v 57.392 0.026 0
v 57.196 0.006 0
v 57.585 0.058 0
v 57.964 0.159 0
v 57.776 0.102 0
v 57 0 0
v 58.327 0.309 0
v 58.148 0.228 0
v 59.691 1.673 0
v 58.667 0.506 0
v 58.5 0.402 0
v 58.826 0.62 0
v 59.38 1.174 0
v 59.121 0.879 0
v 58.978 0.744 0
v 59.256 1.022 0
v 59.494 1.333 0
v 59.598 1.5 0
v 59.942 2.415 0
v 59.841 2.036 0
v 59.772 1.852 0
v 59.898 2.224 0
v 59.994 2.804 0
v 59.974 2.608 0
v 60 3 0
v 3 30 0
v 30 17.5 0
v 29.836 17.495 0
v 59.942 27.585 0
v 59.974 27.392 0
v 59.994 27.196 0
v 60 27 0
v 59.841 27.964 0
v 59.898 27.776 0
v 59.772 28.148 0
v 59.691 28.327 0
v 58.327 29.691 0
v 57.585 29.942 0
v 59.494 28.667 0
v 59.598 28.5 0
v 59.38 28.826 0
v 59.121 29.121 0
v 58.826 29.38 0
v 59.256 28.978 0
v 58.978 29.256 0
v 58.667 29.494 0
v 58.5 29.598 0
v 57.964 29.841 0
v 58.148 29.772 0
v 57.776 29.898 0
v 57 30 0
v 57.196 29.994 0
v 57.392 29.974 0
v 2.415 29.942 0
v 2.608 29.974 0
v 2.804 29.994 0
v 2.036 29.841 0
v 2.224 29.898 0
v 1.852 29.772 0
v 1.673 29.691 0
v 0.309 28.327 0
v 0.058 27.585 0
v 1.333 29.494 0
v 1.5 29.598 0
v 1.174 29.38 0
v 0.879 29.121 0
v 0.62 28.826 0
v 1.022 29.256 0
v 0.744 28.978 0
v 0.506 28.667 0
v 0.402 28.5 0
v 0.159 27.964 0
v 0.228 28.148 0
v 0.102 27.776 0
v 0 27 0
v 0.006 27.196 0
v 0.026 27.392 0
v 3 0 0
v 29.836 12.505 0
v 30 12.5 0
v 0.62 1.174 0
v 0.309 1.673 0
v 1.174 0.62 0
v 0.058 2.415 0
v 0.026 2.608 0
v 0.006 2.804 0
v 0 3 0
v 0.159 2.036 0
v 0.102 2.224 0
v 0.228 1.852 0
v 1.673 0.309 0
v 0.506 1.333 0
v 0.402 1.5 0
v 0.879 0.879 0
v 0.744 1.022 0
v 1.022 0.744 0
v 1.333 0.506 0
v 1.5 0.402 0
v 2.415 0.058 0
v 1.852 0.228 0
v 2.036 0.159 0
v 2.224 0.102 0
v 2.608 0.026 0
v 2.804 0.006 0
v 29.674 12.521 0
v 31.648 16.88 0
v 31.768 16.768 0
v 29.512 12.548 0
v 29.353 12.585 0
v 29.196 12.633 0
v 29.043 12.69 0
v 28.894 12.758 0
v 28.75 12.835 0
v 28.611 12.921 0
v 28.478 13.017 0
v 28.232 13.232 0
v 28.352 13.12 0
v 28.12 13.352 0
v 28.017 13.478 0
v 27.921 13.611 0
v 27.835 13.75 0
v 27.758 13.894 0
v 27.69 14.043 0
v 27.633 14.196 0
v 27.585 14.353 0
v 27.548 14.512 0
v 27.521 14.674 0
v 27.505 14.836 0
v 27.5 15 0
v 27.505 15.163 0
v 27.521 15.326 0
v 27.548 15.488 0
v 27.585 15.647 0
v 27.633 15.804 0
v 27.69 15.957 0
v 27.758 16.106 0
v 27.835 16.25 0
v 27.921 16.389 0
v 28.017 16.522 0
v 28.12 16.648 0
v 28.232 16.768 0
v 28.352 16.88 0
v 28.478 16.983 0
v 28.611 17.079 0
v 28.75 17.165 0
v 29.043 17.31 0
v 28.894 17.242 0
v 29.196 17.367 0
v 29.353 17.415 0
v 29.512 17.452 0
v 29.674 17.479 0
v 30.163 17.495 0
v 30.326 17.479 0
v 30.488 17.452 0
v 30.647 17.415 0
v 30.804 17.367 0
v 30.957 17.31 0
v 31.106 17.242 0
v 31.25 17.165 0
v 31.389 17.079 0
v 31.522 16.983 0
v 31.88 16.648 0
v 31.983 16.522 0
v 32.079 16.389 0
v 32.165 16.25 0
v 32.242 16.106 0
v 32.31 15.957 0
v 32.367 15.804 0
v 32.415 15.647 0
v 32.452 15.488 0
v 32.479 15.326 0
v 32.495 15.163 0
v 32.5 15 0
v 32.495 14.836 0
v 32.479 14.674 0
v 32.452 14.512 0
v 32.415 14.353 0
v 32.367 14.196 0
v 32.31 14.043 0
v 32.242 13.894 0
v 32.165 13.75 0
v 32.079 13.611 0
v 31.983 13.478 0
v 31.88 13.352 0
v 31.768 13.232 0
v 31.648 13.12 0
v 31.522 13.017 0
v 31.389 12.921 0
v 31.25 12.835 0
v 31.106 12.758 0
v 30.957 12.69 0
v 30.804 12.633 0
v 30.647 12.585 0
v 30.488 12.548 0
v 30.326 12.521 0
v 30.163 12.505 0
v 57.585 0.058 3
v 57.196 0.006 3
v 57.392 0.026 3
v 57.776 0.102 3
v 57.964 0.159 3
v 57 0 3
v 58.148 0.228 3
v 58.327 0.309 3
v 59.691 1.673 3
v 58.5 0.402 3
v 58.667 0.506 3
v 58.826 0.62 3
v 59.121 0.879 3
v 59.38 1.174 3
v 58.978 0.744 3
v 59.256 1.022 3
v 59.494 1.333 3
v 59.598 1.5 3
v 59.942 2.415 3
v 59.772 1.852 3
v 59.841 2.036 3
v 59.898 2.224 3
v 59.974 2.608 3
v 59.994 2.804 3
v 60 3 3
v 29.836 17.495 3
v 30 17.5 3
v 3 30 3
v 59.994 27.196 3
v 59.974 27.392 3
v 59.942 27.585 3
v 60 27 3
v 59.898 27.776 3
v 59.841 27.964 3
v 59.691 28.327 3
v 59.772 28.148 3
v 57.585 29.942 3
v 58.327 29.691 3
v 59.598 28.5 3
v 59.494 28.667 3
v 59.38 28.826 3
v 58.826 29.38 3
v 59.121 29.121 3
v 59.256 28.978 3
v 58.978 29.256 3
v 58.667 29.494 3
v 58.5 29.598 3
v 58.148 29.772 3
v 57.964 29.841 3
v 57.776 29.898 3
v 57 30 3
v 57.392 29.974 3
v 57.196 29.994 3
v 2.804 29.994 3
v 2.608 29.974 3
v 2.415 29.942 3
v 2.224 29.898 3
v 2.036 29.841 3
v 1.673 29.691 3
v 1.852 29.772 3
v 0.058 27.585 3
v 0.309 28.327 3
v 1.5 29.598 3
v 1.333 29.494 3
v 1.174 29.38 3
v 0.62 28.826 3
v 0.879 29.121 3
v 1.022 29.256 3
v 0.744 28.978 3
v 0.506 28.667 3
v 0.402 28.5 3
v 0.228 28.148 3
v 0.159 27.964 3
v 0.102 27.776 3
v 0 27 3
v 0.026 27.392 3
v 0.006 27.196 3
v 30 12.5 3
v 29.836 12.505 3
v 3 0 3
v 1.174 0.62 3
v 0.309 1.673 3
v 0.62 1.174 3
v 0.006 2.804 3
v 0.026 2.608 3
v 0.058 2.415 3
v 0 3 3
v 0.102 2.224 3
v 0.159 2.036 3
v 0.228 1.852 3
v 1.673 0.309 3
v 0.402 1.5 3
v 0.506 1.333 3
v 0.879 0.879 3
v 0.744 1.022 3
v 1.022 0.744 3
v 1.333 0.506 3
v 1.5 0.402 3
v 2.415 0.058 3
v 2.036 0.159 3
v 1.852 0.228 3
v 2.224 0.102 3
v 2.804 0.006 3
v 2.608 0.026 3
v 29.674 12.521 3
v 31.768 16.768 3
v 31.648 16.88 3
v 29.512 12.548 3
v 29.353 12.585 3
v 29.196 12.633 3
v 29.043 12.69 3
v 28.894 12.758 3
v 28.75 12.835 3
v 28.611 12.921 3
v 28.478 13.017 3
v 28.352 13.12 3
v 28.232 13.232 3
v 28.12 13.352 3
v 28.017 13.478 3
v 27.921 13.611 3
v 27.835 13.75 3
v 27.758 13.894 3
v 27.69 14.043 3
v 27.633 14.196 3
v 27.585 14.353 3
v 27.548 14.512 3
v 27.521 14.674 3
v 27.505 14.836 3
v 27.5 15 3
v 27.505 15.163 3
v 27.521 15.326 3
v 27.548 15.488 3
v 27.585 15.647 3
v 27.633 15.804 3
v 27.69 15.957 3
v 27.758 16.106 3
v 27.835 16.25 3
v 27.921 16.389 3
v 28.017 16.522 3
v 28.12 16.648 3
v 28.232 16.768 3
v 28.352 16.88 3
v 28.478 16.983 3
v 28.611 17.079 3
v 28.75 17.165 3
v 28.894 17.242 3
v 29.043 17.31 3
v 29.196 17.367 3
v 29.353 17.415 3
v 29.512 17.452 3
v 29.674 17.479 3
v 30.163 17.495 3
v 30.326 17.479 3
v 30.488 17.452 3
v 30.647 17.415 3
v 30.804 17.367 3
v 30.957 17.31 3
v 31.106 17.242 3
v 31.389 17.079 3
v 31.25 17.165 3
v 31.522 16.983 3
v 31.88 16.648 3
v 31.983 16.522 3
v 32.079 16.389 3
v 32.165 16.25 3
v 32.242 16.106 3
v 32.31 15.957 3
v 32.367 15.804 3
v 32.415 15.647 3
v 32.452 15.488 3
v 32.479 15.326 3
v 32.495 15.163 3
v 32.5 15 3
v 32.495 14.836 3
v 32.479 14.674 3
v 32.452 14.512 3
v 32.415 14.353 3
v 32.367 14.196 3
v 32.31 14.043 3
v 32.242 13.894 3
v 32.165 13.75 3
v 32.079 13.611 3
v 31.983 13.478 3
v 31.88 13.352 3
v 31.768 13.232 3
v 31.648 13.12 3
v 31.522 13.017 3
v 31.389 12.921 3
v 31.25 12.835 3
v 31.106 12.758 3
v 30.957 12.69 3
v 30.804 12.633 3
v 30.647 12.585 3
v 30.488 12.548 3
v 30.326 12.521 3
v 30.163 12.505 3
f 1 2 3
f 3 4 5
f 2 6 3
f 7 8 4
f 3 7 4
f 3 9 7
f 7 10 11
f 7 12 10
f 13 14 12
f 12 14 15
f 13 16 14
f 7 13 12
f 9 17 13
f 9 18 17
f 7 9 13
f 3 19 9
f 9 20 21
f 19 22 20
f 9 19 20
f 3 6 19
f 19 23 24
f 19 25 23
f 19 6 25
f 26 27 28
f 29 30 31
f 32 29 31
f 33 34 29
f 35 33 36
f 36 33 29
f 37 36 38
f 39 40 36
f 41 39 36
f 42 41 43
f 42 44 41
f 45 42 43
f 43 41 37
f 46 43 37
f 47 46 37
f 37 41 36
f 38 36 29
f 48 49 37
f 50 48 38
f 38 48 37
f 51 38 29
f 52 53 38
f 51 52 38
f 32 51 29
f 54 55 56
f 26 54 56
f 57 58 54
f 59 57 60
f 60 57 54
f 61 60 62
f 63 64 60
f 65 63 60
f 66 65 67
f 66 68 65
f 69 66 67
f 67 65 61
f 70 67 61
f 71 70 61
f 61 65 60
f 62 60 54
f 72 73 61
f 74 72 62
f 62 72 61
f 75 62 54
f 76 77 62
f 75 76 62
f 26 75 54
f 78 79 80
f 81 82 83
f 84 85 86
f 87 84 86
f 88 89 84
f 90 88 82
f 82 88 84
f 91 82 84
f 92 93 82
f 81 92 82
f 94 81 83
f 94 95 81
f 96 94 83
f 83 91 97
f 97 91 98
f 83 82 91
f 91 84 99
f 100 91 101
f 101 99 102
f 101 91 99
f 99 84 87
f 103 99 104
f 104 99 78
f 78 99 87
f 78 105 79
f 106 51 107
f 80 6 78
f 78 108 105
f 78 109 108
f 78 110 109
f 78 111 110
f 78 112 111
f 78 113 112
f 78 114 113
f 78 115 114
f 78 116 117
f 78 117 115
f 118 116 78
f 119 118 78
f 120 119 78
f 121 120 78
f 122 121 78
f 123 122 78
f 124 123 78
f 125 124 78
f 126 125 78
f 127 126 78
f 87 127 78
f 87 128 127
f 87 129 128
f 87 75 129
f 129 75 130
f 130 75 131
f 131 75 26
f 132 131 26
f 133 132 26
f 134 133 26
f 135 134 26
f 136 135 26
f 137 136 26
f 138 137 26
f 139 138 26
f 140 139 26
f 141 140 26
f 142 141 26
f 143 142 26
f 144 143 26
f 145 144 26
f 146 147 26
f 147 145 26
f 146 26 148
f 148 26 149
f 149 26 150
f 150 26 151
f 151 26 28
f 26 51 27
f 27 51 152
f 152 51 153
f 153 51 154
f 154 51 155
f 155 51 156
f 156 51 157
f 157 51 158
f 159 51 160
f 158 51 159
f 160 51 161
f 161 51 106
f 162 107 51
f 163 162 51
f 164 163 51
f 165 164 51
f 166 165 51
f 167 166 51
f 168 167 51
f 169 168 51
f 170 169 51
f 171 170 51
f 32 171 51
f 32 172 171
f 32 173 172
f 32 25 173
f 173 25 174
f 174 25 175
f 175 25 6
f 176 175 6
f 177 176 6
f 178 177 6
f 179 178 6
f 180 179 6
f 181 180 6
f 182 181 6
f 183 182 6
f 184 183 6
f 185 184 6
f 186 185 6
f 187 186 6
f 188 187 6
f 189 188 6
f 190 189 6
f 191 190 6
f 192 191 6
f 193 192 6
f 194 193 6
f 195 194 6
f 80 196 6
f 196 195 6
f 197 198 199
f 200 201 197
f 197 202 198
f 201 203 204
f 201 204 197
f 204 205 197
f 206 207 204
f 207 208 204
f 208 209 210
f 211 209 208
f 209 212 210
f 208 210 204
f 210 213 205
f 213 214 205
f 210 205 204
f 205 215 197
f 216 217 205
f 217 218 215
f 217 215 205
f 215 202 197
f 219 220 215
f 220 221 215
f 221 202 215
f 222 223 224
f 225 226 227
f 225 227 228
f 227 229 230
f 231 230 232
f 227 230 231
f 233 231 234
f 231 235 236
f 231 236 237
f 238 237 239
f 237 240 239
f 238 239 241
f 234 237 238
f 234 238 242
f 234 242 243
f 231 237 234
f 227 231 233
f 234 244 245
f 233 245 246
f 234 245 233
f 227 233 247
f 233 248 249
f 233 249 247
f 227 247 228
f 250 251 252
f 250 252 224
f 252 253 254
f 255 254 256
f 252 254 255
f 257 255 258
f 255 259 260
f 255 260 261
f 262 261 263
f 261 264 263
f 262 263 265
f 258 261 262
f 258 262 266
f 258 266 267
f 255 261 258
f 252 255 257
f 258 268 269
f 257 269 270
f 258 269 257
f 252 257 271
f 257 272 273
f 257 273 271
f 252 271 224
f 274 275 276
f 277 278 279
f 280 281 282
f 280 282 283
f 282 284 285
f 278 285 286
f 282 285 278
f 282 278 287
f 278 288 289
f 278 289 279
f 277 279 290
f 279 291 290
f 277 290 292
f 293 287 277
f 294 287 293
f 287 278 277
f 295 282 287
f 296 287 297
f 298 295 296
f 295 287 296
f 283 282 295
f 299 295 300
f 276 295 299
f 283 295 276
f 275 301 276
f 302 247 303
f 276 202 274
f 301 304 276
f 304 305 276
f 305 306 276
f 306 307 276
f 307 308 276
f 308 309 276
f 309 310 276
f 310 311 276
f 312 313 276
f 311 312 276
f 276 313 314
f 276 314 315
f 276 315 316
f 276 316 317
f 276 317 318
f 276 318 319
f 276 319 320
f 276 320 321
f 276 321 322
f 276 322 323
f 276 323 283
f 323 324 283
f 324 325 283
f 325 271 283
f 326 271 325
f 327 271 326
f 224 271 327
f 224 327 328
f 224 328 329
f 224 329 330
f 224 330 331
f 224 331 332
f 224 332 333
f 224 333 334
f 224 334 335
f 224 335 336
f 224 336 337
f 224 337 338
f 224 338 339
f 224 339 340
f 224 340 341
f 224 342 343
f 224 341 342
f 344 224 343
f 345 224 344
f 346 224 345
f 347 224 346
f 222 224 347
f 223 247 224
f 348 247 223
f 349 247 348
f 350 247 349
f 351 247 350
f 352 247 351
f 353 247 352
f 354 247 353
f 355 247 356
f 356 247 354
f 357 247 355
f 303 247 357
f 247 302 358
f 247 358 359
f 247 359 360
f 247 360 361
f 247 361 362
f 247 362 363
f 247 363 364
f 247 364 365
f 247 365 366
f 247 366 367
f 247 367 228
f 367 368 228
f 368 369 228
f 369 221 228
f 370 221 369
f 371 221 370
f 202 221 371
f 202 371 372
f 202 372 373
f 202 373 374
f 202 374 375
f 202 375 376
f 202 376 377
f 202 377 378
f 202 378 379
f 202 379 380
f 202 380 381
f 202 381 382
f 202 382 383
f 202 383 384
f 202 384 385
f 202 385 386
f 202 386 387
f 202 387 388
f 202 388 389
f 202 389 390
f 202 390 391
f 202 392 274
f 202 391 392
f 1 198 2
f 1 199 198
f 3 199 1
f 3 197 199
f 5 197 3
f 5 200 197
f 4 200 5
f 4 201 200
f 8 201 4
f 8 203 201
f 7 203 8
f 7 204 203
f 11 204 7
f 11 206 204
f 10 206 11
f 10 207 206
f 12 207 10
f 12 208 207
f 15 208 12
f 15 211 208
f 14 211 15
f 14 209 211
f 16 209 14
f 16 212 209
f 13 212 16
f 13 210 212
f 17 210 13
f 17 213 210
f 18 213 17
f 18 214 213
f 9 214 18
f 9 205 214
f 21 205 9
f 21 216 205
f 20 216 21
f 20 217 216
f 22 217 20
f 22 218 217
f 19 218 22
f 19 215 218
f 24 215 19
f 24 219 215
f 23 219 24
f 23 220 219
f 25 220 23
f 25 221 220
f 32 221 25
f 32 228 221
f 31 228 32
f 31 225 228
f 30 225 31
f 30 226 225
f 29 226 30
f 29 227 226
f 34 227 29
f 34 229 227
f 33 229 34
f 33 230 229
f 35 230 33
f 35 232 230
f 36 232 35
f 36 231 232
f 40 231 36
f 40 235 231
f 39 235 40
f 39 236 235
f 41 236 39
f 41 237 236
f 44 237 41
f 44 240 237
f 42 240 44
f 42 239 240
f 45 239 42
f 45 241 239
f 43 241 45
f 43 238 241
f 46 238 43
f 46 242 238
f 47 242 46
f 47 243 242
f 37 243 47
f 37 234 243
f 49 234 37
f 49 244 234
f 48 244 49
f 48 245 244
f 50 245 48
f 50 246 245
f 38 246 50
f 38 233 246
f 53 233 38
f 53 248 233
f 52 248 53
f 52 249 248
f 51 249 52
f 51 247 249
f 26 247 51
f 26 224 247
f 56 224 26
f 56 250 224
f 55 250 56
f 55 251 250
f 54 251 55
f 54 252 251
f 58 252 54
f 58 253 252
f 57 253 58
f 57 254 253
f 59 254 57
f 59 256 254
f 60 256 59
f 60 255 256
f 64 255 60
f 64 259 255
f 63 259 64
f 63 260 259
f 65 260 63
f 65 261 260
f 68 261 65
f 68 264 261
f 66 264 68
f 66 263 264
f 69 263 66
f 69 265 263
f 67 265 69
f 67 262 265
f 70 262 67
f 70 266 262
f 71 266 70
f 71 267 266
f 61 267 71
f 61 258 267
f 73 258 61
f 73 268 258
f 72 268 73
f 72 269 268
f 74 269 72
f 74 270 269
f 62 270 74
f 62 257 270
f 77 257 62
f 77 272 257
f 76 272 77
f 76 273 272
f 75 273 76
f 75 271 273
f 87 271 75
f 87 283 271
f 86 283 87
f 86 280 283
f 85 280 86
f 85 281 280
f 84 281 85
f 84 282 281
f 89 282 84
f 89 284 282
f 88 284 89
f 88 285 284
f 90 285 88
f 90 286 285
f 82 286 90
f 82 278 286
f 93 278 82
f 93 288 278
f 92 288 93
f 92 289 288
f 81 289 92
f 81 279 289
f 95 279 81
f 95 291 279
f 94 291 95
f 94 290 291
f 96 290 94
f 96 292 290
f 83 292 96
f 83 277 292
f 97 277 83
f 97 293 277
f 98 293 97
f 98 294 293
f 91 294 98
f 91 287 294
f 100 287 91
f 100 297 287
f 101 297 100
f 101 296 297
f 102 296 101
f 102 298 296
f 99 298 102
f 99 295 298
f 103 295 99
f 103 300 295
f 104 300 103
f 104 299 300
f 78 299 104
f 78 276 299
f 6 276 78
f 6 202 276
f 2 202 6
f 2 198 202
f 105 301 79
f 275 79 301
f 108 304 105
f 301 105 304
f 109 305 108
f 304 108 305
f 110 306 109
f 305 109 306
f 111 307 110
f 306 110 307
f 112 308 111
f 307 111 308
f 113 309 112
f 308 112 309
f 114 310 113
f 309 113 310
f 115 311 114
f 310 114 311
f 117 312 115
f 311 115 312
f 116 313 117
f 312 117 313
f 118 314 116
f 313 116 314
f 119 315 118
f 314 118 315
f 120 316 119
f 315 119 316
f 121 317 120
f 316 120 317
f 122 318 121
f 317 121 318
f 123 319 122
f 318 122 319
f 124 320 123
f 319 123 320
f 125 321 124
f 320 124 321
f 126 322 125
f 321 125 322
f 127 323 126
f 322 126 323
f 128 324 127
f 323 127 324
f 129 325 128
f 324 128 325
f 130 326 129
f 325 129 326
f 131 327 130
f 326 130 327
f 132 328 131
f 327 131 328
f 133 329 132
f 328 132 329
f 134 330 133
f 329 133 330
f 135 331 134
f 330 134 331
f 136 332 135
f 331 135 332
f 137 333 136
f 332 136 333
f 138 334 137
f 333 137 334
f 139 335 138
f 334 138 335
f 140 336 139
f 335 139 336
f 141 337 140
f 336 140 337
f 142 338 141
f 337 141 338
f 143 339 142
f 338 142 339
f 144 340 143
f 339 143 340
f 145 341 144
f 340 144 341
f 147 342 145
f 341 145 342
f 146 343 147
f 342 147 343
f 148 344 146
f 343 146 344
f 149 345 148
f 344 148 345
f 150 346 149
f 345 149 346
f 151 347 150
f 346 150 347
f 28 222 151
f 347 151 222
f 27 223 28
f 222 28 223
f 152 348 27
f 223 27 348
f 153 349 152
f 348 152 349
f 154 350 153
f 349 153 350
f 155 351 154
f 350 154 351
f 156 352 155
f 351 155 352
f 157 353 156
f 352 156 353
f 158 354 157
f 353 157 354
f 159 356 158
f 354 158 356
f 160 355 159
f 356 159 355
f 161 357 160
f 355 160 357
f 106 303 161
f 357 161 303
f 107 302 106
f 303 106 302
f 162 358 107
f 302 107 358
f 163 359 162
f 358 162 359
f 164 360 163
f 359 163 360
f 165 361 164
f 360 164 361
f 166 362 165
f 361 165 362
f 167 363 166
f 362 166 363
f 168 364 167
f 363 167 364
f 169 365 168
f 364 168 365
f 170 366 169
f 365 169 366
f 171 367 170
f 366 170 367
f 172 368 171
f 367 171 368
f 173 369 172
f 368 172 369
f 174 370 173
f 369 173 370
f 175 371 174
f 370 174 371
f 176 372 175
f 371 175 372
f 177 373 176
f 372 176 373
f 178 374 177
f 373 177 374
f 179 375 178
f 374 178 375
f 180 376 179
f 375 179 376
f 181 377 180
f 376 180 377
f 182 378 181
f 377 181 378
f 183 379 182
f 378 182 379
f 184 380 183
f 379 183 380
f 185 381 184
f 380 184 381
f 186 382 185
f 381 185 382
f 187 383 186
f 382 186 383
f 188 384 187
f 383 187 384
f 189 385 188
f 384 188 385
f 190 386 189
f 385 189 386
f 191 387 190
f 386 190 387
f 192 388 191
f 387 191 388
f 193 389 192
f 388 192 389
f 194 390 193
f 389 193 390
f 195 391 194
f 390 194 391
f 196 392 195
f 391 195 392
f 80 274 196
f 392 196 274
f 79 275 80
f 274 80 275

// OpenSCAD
// file: component_2d.scad
// Canonical manufacturing profile for the component template.
module tpl_component_plate_2d(size=[60, 30], hole_diameter=5,
                              corner_radius=3)
{
    assert(size[0] > 2*corner_radius && size[1] > 2*corner_radius,
           "tpl_component_plate_2d: radius consumes the plate");
    assert(hole_diameter > 0 && hole_diameter < min(size),
           "tpl_component_plate_2d: invalid hole diameter");

    difference() {
        translate([corner_radius, corner_radius])
            offset(r=corner_radius)
                square([size[0]-2*corner_radius,
                        size[1]-2*corner_radius]);
        translate(size/2)
            circle(d=hole_diameter);
    }
}
// main file
use <component_2d.scad>

/* [Output] */
make_3d = true; // [false:true]

/* [Dimensions] */
plate_size = [60, 30];
material_thickness = 3; // [0.5:0.5:12]
hole_diameter = 5;      // [1:0.5:20]
corner_radius = 3;      // [0:0.5:12]

/* [Example] */
example_color = "burlywood";

/* [Hidden] */
$fn = $preview ? 32 : 96;

tpl_component_plate(
    size=plate_size,
    thickness=material_thickness,
    hole_diameter=hole_diameter,
    corner_radius=corner_radius,
    make_3d=make_3d,
    part_color=example_color
);

// Public wrapper. The 3D branch only extrudes the canonical 2D profile.
module tpl_component_plate(size=[60, 30], thickness=3,
                           hole_diameter=5, corner_radius=3,
                           make_3d=false, part_color="burlywood")
{
    assert(thickness > 0,
           "tpl_component_plate: thickness must be positive");

    color(part_color)
        if (make_3d)
            linear_extrude(height=thickness)
                tpl_component_plate_2d(
                    size=size,
                    hole_diameter=hole_diameter,
                    corner_radius=corner_radius);
        else
            tpl_component_plate_2d(
                size=size,
                hole_diameter=hole_diameter,
                corner_radius=corner_radius);
}
